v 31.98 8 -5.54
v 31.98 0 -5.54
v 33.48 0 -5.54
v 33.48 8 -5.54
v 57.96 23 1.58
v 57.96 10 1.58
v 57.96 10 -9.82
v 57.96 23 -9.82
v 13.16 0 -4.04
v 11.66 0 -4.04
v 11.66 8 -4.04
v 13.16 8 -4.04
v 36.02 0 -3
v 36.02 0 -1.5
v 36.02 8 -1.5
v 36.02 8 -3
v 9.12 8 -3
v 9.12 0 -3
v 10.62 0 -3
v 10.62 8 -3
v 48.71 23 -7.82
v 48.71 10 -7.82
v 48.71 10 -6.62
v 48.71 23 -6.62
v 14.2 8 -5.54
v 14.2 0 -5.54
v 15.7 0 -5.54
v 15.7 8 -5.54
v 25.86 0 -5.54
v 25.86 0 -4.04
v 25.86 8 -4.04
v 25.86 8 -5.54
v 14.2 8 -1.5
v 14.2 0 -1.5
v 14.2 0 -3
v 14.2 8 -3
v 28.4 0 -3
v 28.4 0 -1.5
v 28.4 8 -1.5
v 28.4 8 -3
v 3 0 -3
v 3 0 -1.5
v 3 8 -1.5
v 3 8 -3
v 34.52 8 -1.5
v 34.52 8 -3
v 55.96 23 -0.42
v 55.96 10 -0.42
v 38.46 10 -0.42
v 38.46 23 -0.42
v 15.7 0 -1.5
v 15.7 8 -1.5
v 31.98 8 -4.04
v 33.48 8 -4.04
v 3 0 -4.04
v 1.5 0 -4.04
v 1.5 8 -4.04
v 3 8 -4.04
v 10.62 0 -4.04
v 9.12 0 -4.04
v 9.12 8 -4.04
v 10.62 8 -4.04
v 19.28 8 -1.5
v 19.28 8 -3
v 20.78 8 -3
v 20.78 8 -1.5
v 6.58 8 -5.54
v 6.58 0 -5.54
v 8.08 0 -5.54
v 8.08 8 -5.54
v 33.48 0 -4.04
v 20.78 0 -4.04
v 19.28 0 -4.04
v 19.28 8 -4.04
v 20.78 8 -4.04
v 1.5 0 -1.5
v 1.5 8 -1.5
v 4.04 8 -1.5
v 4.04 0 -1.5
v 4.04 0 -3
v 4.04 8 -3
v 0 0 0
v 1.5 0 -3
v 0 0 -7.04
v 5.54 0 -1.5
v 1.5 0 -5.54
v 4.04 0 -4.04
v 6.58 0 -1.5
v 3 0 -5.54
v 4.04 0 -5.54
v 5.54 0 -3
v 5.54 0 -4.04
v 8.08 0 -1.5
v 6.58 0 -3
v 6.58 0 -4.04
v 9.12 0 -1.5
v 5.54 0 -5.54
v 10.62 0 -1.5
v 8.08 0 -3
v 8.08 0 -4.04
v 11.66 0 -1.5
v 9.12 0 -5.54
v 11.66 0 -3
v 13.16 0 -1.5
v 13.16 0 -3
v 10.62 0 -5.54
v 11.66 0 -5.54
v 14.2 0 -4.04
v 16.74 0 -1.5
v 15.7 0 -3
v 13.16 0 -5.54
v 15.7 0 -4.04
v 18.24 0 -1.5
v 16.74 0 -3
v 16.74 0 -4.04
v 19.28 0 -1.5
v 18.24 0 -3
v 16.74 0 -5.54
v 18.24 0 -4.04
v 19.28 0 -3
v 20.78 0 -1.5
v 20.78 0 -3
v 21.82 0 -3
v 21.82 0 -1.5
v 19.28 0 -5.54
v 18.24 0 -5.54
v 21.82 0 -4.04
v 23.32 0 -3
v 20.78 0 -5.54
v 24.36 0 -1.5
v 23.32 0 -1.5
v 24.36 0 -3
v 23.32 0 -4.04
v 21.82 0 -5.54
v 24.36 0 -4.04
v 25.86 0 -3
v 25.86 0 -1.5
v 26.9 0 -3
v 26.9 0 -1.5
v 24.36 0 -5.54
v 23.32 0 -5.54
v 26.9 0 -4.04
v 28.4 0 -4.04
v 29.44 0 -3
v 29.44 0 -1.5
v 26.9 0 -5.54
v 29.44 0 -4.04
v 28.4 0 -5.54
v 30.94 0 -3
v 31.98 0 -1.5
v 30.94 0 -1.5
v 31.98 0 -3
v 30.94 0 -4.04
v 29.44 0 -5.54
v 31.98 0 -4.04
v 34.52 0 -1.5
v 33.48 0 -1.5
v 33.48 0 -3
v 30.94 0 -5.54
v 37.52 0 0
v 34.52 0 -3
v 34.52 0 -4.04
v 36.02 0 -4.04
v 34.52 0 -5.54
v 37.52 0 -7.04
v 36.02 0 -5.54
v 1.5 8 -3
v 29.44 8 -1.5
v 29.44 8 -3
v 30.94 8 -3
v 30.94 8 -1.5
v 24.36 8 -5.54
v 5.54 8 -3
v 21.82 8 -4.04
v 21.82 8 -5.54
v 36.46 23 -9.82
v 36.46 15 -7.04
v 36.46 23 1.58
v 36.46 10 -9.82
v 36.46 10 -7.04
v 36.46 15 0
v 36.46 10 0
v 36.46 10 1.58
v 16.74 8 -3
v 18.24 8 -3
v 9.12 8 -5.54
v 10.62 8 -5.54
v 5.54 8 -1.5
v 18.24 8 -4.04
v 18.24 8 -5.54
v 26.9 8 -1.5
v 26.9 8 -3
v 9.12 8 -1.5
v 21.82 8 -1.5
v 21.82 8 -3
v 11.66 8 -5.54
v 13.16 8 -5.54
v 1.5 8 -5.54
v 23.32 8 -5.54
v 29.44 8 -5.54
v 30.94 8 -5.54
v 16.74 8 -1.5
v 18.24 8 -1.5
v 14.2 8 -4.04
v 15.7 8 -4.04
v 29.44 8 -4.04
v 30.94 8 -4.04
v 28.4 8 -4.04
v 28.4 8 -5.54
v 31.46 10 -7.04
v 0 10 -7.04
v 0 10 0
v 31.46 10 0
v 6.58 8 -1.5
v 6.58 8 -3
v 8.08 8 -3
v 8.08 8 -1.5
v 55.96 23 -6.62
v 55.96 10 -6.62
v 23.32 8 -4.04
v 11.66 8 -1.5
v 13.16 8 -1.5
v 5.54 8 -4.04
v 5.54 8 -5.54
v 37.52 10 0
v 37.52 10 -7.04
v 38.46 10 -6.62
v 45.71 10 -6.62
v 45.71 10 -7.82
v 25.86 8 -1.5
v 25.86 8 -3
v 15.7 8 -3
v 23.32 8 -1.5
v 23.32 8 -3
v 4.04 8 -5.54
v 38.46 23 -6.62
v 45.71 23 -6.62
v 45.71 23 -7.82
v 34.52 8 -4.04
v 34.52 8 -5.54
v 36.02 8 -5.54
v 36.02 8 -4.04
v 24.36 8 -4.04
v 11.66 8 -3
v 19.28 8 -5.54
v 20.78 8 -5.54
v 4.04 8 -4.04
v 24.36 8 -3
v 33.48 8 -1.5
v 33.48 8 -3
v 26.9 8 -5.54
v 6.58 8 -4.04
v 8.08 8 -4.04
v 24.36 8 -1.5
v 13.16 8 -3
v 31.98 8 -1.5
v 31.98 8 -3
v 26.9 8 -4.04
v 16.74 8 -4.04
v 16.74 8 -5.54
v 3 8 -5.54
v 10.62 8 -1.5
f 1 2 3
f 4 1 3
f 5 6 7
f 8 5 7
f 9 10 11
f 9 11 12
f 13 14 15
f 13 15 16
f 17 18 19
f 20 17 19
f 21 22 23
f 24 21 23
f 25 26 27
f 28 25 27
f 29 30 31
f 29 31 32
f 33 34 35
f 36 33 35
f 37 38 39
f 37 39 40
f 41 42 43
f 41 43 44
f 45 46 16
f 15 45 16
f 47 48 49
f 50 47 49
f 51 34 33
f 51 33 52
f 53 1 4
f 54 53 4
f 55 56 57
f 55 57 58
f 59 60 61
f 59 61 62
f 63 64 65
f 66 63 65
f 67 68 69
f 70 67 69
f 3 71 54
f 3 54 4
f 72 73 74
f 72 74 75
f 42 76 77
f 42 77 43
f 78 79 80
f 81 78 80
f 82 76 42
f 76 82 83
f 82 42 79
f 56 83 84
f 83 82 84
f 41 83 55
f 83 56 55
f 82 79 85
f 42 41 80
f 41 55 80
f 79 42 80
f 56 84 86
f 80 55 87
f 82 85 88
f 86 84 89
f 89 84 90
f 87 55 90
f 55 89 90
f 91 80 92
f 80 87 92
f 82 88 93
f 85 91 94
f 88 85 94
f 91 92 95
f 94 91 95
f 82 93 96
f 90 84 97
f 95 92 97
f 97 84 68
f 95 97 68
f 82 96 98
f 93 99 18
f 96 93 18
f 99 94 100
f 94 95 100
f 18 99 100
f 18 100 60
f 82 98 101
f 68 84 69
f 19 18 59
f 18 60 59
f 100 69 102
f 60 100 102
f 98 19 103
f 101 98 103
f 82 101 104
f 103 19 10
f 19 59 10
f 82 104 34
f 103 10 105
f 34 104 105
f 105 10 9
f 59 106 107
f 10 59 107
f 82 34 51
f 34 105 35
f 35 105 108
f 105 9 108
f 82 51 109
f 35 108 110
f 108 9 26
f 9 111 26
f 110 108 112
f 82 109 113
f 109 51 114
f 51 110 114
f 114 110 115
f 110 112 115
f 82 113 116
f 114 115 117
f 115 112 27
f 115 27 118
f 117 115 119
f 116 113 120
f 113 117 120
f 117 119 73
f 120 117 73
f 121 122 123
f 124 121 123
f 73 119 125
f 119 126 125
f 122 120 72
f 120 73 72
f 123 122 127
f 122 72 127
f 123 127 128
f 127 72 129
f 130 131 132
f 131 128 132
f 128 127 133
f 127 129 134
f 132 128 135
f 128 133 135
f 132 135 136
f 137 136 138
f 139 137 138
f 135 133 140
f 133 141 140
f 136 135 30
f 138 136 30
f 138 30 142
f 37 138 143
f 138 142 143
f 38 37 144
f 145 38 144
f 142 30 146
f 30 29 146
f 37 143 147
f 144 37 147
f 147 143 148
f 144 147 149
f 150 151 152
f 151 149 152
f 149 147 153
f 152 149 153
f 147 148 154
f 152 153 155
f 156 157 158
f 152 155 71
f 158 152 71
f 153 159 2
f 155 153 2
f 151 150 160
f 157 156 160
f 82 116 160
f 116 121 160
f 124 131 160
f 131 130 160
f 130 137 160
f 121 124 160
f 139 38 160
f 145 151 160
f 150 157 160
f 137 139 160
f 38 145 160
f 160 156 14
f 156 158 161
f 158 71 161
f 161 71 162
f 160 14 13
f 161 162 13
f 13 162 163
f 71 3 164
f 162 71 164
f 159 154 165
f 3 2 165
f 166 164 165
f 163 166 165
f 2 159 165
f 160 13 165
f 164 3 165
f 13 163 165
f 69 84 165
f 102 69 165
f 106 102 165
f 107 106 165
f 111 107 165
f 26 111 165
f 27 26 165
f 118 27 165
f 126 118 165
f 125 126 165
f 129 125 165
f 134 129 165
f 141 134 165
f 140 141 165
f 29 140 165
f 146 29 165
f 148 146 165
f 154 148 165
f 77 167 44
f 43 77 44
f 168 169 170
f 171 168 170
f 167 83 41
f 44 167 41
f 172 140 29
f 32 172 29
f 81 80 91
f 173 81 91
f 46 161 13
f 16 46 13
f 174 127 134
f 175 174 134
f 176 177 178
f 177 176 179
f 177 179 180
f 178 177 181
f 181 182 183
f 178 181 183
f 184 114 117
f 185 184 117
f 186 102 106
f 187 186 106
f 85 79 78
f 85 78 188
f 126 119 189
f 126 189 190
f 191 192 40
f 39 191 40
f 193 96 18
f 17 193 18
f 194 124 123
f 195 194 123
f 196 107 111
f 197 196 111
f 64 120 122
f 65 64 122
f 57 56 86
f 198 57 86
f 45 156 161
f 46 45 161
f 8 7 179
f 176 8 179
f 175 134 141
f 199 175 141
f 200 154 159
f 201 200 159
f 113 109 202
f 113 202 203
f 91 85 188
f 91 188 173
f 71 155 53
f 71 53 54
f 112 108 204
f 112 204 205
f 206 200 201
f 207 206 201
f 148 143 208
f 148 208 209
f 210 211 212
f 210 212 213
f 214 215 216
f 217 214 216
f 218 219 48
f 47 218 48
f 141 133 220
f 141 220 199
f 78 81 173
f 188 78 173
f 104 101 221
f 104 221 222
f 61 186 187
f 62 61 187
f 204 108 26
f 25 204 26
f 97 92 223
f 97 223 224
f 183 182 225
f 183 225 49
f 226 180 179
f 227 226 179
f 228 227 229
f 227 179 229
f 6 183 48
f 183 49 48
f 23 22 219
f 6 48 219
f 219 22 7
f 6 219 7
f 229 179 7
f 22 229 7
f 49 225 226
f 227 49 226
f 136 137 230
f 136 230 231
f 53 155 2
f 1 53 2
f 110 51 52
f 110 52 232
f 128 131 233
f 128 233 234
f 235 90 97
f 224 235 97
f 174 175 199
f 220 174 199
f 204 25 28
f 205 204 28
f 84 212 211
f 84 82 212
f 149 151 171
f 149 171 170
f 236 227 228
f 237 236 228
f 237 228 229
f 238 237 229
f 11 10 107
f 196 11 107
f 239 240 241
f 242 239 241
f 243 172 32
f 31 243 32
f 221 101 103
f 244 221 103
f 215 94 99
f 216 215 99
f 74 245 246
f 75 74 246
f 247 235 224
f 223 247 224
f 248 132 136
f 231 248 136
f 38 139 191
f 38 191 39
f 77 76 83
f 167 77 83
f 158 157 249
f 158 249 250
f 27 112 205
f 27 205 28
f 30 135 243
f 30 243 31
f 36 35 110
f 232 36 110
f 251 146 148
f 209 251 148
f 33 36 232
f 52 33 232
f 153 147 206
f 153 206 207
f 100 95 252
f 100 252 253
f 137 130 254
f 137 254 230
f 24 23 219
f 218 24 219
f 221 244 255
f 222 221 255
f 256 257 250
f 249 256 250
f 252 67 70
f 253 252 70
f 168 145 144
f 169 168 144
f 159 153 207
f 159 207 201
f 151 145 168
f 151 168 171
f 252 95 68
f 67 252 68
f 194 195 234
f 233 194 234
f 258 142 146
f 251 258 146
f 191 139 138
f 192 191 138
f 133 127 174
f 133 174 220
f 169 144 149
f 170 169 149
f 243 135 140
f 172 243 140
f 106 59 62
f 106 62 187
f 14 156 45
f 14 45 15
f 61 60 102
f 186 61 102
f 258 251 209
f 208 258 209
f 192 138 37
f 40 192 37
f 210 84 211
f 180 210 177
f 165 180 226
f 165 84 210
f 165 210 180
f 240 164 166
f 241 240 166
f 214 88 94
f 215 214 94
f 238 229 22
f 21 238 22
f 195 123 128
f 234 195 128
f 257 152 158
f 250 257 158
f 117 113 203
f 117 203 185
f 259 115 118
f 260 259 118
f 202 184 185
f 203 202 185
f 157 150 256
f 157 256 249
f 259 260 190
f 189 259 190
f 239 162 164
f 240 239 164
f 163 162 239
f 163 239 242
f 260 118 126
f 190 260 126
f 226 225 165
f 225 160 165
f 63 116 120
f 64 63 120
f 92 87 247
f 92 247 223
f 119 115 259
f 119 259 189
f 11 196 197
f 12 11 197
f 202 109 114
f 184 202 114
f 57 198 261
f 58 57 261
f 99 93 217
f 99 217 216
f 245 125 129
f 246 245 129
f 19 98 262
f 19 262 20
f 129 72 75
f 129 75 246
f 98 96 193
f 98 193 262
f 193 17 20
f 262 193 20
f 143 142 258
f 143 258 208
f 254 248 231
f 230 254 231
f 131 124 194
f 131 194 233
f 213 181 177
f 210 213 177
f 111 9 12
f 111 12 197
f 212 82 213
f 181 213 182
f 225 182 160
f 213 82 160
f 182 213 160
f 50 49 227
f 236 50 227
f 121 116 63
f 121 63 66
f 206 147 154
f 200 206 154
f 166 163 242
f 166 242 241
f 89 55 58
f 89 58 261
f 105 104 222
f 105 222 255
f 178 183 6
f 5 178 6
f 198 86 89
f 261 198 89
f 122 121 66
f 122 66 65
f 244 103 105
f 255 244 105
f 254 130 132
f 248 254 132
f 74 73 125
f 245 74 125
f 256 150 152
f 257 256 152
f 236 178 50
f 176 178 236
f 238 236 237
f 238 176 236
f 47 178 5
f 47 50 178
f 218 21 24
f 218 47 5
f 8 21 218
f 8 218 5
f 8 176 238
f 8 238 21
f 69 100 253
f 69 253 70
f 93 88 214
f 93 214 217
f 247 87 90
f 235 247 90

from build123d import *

# Parameters (mm, degrees)
SKETCH1_W           = 37.52
SKETCH1_H           = 7.04
SKETCH1_W_2         = 1.5
SKETCH1_H_2         = 1.5
BOSS_EXTRUDE1_DEPTH = 8
SKETCH2_W           = 37.52
SKETCH2_H           = 7.04
BOSS_EXTRUDE2_DEPTH = 2
SKETCH3_W           = 1.06
SKETCH3_H           = 7.04
BOSS_EXTRUDE3_DEPTH = 13
CHAMFER1_SIZE       = 5


with BuildPart() as part:
    # Sketch1 → Boss-Extrude1 (new body)
    with BuildSketch(Plane(origin=(0, 0, 0), x_dir=(1, 0, 0), z_dir=(0, 1, 0))):
        with Locations((18.76, 3.52)):
            Rectangle(SKETCH1_W, SKETCH1_H)
        with Locations((4.79, 2.25)):
            Rectangle(SKETCH1_W_2, SKETCH1_H_2, mode=Mode.SUBTRACT)
        with Locations((2.25, 2.25)):
            Rectangle(SKETCH1_W_2, SKETCH1_H_2, mode=Mode.SUBTRACT)
        with Locations((7.33, 2.25)):
            Rectangle(SKETCH1_W_2, SKETCH1_H_2, mode=Mode.SUBTRACT)
        with Locations((9.87, 2.25)):
            Rectangle(SKETCH1_W_2, SKETCH1_H_2, mode=Mode.SUBTRACT)
        with Locations((12.41, 2.25)):
            Rectangle(SKETCH1_W_2, SKETCH1_H_2, mode=Mode.SUBTRACT)
        with Locations((14.95, 2.25)):
            Rectangle(SKETCH1_W_2, SKETCH1_H_2, mode=Mode.SUBTRACT)
        with Locations((17.49, 2.25)):
            Rectangle(SKETCH1_W_2, SKETCH1_H_2, mode=Mode.SUBTRACT)
        with Locations((20.03, 2.25)):
            Rectangle(SKETCH1_W_2, SKETCH1_H_2, mode=Mode.SUBTRACT)
        with Locations((22.57, 2.25)):
            Rectangle(SKETCH1_W_2, SKETCH1_H_2, mode=Mode.SUBTRACT)
        with Locations((25.11, 2.25)):
            Rectangle(SKETCH1_W_2, SKETCH1_H_2, mode=Mode.SUBTRACT)
        with Locations((27.65, 2.25)):
            Rectangle(SKETCH1_W_2, SKETCH1_H_2, mode=Mode.SUBTRACT)
        with Locations((30.19, 2.25)):
            Rectangle(SKETCH1_W_2, SKETCH1_H_2, mode=Mode.SUBTRACT)
        with Locations((32.73, 2.25)):
            Rectangle(SKETCH1_W_2, SKETCH1_H_2, mode=Mode.SUBTRACT)
        with Locations((35.27, 2.25)):
            Rectangle(SKETCH1_W_2, SKETCH1_H_2, mode=Mode.SUBTRACT)
        with Locations((4.79, 4.79)):
            Rectangle(SKETCH1_W_2, SKETCH1_H_2, mode=Mode.SUBTRACT)
        with Locations((7.33, 4.79)):
            Rectangle(SKETCH1_W_2, SKETCH1_H_2, mode=Mode.SUBTRACT)
        with Locations((9.87, 4.79)):
            Rectangle(SKETCH1_W_2, SKETCH1_H_2, mode=Mode.SUBTRACT)
        with Locations((12.41, 4.79)):
            Rectangle(SKETCH1_W_2, SKETCH1_H_2, mode=Mode.SUBTRACT)
        with Locations((14.95, 4.79)):
            Rectangle(SKETCH1_W_2, SKETCH1_H_2, mode=Mode.SUBTRACT)
        with Locations((17.49, 4.79)):
            Rectangle(SKETCH1_W_2, SKETCH1_H_2, mode=Mode.SUBTRACT)
        with Locations((20.03, 4.79)):
            Rectangle(SKETCH1_W_2, SKETCH1_H_2, mode=Mode.SUBTRACT)
        with Locations((22.57, 4.79)):
            Rectangle(SKETCH1_W_2, SKETCH1_H_2, mode=Mode.SUBTRACT)
        with Locations((25.11, 4.79)):
            Rectangle(SKETCH1_W_2, SKETCH1_H_2, mode=Mode.SUBTRACT)
        with Locations((27.65, 4.79)):
            Rectangle(SKETCH1_W_2, SKETCH1_H_2, mode=Mode.SUBTRACT)
        with Locations((30.19, 4.79)):
            Rectangle(SKETCH1_W_2, SKETCH1_H_2, mode=Mode.SUBTRACT)
        with Locations((32.73, 4.79)):
            Rectangle(SKETCH1_W_2, SKETCH1_H_2, mode=Mode.SUBTRACT)
        with Locations((35.27, 4.79)):
            Rectangle(SKETCH1_W_2, SKETCH1_H_2, mode=Mode.SUBTRACT)
        with Locations((2.25, 4.79)):
            Rectangle(SKETCH1_W_2, SKETCH1_H_2, mode=Mode.SUBTRACT)
    extrude(amount=BOSS_EXTRUDE1_DEPTH)

    # Sketch2 → Boss-Extrude2 (add)
    with BuildSketch(Plane(origin=(0, 8, 0), x_dir=(1, 0, 0), z_dir=(0, 1, 0))):
        with Locations((18.76, 3.52)):
            Rectangle(SKETCH2_W, SKETCH2_H)
    extrude(amount=BOSS_EXTRUDE2_DEPTH)

    # Sketch3 → Boss-Extrude3 (add)
    # profile 1 of 2: a face of its own
    with BuildSketch(Plane(origin=(0, 10, 0), x_dir=(1, 0, 0), z_dir=(0, 1, 0))):
        Polygon((57.96, 9.82), (36.46, 9.82), (36.46, 7.04), (37.52, 7.04), (37.52, 0), (36.46, 0), (36.46, -1.58), (57.96, -1.58), align=None)
        Polygon((38.46, 0.42), (38.46, 6.62), (45.71, 6.62), (45.71, 7.82), (48.71, 7.82), (48.71, 6.62), (55.96, 6.62), (55.96, 0.42), align=None, mode=Mode.SUBTRACT)
    # profile 2 of 2: a face of its own
    with BuildSketch(Plane(origin=(0, 10, 0), x_dir=(1, 0, 0), z_dir=(0, 1, 0))):
        with Locations((36.99, 3.52)):
            Rectangle(SKETCH3_W, SKETCH3_H)
    extrude(amount=BOSS_EXTRUDE3_DEPTH)

    # Chamfer1
    chamfer1_edges = [part.edges().sort_by_distance(p)[0] for p in [
        (36.46, 10, -3.52),
    ]]
    chamfer(chamfer1_edges, length=CHAMFER1_SIZE)


solid = part.part
